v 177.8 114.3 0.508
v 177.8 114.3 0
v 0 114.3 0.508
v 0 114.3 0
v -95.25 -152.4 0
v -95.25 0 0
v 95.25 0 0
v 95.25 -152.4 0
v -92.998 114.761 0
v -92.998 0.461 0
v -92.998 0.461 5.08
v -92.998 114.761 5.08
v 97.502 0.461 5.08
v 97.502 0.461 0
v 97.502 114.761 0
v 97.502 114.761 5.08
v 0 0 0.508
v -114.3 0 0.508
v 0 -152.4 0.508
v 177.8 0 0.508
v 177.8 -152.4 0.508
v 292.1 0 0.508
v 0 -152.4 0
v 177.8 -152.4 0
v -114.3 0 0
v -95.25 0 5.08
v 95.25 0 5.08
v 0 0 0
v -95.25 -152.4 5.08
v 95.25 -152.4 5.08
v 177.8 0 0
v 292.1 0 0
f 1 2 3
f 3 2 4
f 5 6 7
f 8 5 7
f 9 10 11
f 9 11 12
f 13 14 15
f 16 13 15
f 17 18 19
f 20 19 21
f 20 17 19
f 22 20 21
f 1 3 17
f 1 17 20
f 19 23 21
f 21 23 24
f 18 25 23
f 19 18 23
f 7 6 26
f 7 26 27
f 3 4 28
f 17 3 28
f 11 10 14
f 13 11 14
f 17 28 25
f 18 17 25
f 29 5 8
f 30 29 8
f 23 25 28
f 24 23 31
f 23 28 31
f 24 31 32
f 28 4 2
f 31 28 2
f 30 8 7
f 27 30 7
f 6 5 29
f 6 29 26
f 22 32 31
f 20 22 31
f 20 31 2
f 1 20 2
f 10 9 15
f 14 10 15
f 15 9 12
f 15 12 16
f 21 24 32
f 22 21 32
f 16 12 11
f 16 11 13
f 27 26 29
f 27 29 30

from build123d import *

# Parameters (mm, degrees)
F0_W     = 190.5
F0_H     = 114.3
F1_DEPTH = 5.08
F2_W     = 190.5
F2_H     = 152.4
F3_DEPTH = 5.08
F5_DEPTH = 0.508


with BuildPart() as f1:
    # F0 (on Top) → F1 (new body)
    with BuildSketch(Plane.XY):
        with Locations((2.252422, 57.610989)):
            Rectangle(F0_W, F0_H)
    extrude(amount=F1_DEPTH)


with BuildPart() as f3:
    # F2 (on Top) → F3 (new body)
    with BuildSketch(Plane.XY):
        with Locations((0, -76.2)):
            Rectangle(F2_W, F2_H)
    extrude(amount=F3_DEPTH)


with BuildPart() as f5:
    # F4 (on Top) → F5 (new body)
    with BuildSketch(Plane.XY):
        Polygon((0, 114.3), (0, 0), (0, -152.4), (177.8, -152.4), (177.8, 0), (177.8, 114.3), align=None)
        Polygon((0, -152.4), (0, 0), (-114.3, 0), align=None)
        Polygon((177.8, 0), (177.8, -152.4), (292.1, 0), align=None)
    extrude(amount=F5_DEPTH)


solid = Compound([f1.part, f3.part, f5.part])
